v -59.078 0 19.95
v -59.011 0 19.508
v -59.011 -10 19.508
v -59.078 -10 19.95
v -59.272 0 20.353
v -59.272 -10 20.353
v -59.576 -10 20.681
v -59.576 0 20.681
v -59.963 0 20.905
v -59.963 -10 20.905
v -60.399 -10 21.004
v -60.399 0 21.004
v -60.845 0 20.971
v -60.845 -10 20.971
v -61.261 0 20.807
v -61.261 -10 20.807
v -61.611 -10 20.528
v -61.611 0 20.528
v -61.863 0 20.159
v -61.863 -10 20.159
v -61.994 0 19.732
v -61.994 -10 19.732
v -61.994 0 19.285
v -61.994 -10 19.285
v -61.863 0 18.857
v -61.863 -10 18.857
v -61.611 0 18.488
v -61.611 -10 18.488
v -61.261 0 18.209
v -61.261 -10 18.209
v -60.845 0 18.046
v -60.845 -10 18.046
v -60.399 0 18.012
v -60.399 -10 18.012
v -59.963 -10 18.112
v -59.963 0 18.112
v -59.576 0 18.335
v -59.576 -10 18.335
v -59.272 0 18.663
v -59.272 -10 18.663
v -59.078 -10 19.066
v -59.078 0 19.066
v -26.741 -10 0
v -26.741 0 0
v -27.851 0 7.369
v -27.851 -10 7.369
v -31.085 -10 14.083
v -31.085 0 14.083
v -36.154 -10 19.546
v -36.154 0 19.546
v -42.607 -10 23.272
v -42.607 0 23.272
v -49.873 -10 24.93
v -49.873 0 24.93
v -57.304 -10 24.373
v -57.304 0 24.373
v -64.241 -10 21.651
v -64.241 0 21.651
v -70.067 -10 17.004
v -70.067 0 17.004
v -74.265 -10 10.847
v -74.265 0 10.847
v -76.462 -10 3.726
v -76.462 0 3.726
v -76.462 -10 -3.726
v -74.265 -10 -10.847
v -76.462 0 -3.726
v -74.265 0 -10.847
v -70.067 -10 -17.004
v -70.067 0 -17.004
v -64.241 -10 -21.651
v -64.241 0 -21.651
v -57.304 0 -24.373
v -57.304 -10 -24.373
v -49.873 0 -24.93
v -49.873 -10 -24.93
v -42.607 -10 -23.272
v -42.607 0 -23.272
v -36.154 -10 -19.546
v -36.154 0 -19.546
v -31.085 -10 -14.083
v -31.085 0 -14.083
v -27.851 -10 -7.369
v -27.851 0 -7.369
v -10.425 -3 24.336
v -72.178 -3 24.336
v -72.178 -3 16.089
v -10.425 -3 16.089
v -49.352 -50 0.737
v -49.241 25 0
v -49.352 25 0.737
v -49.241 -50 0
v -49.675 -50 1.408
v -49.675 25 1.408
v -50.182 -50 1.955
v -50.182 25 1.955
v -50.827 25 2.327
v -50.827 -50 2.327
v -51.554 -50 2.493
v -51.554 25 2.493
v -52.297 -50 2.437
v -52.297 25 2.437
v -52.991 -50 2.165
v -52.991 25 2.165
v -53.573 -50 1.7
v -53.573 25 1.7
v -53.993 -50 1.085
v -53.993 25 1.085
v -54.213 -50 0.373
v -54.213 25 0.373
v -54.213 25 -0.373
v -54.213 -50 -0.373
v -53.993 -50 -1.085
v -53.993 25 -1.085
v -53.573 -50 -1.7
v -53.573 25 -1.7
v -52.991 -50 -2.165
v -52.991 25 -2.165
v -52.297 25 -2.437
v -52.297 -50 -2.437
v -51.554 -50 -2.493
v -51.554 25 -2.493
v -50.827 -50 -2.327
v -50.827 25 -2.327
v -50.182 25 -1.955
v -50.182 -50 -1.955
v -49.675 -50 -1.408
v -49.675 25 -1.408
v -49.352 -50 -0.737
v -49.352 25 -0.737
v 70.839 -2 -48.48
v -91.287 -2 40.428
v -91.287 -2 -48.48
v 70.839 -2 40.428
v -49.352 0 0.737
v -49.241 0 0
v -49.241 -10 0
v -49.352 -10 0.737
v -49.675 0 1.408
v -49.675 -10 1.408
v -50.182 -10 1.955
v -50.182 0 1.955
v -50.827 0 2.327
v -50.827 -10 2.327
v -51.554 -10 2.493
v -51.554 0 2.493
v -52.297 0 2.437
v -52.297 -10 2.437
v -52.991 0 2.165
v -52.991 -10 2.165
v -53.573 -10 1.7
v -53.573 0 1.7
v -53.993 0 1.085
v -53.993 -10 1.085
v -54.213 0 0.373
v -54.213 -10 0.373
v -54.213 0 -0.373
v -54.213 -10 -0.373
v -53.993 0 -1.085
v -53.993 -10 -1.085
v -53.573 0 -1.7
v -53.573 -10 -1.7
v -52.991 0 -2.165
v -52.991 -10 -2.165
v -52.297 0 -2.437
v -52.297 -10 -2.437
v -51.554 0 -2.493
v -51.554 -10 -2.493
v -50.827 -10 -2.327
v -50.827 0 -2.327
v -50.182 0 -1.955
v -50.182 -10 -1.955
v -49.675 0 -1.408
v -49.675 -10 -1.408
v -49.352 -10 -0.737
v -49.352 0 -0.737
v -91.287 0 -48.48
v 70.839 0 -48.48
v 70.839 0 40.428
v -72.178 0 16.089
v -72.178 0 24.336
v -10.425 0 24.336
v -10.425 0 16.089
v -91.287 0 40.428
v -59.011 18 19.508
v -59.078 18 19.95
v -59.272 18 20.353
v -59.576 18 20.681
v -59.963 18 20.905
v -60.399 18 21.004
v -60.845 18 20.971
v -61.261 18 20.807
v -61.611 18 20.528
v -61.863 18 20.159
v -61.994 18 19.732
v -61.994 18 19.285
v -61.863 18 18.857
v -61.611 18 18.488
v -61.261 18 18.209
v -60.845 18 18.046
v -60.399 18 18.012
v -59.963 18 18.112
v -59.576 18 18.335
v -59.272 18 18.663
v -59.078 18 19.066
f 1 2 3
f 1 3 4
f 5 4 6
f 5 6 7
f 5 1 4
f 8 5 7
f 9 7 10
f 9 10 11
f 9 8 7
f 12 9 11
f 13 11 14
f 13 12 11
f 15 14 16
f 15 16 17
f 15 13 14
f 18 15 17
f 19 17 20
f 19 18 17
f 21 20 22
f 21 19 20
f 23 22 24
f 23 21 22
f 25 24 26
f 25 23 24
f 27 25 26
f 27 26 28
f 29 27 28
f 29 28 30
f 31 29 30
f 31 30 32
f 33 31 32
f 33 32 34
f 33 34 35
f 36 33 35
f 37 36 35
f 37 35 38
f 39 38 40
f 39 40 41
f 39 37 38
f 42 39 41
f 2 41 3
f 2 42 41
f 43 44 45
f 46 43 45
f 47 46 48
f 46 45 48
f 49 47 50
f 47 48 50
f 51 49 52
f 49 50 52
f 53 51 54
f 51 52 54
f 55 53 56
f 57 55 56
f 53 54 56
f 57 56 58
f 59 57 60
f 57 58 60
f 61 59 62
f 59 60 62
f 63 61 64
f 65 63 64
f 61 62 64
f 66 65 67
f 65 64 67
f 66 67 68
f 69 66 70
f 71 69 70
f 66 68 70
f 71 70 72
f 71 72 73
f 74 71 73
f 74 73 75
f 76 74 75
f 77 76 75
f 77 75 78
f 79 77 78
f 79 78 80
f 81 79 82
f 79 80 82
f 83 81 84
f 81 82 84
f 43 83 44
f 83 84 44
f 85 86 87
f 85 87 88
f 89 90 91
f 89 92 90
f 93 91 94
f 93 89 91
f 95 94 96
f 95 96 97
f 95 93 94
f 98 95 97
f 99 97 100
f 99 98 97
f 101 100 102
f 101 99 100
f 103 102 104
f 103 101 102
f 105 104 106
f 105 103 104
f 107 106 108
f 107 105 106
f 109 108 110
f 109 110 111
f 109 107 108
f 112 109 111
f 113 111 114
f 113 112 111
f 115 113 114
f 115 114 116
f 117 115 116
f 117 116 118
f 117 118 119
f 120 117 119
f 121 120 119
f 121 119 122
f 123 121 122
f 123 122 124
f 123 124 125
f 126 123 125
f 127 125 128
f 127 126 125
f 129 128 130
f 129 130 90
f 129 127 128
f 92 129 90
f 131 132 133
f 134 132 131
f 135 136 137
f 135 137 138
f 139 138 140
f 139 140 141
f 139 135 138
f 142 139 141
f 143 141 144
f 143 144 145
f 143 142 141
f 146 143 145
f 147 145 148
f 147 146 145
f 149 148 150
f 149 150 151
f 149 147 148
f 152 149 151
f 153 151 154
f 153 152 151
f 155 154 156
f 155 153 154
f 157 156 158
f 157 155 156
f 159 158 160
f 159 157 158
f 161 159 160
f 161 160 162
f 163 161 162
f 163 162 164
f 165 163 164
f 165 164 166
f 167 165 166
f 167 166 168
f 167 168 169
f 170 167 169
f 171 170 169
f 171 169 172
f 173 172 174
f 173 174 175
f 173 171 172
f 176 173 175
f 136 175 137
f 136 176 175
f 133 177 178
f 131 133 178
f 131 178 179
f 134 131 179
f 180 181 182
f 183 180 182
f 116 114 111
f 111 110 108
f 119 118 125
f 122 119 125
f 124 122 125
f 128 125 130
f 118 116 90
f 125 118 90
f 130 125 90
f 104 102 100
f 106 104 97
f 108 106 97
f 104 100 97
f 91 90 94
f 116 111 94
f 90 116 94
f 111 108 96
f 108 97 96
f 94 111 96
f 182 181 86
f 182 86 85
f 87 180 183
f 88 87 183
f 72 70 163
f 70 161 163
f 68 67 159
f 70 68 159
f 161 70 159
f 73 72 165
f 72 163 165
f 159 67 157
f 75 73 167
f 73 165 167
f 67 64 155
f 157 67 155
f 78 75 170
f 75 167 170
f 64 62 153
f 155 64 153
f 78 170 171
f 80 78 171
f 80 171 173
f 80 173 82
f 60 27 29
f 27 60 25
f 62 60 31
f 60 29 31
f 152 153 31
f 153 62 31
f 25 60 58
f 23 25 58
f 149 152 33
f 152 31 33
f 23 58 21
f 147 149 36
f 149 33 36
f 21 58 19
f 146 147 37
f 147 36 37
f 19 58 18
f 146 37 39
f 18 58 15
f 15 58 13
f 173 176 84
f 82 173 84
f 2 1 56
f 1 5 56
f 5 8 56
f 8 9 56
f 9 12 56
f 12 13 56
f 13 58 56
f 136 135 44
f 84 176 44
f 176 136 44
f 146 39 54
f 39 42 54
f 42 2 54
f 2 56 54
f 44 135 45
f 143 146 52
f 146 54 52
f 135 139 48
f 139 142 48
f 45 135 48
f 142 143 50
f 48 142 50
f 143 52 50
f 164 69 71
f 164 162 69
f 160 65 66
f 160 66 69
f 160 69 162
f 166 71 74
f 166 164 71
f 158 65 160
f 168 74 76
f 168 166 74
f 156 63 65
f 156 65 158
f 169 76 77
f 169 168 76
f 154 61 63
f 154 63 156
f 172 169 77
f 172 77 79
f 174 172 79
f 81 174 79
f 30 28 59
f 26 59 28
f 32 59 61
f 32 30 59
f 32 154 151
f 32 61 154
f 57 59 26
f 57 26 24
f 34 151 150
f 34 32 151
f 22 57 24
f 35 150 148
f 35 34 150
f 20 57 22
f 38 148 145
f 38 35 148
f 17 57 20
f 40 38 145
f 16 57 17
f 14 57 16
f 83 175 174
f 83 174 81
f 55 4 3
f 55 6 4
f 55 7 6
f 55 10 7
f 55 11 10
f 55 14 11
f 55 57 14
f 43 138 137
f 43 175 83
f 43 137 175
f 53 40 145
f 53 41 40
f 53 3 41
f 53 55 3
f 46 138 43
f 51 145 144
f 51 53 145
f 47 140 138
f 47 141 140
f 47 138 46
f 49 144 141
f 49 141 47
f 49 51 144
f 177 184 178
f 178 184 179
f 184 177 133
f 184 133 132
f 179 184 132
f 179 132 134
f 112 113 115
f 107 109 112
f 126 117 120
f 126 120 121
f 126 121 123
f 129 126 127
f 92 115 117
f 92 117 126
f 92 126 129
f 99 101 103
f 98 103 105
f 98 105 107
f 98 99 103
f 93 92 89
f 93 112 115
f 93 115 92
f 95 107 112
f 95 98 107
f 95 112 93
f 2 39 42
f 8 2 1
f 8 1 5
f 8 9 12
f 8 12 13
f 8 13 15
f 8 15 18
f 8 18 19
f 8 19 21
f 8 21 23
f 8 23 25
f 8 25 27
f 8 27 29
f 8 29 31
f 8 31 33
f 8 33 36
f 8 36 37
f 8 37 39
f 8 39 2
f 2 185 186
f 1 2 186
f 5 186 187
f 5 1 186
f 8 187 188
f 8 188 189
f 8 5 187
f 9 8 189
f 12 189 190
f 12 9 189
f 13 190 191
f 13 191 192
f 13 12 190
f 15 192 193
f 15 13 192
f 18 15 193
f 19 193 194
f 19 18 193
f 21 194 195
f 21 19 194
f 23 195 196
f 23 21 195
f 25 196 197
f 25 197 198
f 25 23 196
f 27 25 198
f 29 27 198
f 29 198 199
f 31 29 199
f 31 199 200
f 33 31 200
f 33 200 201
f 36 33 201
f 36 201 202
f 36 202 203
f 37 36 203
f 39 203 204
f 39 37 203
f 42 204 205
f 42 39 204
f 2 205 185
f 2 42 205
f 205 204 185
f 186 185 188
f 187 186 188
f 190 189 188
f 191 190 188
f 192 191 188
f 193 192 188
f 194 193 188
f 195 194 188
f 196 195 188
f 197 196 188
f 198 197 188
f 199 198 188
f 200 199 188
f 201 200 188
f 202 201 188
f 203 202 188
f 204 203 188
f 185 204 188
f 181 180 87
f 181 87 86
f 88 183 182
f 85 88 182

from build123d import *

# Parameters (mm, degrees)
F0_R          = 25
F0_R_2        = 1.5
F0_R_3        = 2.5
F1_DEPTH      = 10
F2_DEPTH      = 50
F2_DEPTH_BACK = 25
F3_W          = 162.1264517307
F3_H          = 88.9080502093
F4_DEPTH      = 2
F5_DEPTH      = 18
F7_DEPTH      = 3
F6_W          = 61.7528790608
F6_H          = 8.2471277565


with BuildPart() as f1:
    # F0 (on Front) → F1 (new body)
    with BuildSketch(Plane.XZ):
        with Locations((-51.7407789791, 0)):
            Circle(F0_R)
        with Locations((-60.5111941695, 19.5082370192)):
            Circle(F0_R_2, mode=Mode.SUBTRACT)
        with Locations((-51.7407789791, 0)):
            Circle(F0_R_3, mode=Mode.SUBTRACT)
    extrude(amount=F1_DEPTH)


with BuildPart() as f2:
    # F0 (on Front) → F2 (new body, two sides)
    with BuildSketch(Plane.XZ) as f2_sk:
        with Locations((-51.7407789791, 0)):
            Circle(F0_R_3)
    extrude(amount=F2_DEPTH)
    extrude(f2_sk.sketch, amount=-F2_DEPTH_BACK)


with BuildPart() as f4:
    # F3 (on Front) → F4 (new body)
    with BuildSketch(Plane.XZ):
        with Locations((-10.2238357067, -4.0262471884)):
            Rectangle(F3_W, F3_H)
    extrude(amount=F4_DEPTH)


with BuildPart() as f5:
    # F0 (on Front) → F5 (new body)
    with BuildSketch(Plane.XZ):
        with Locations((-60.5111941695, 19.5082370192)):
            Circle(F0_R_2)
    extrude(amount=-F5_DEPTH)


with BuildPart() as f7:
    # F0 (on Front) → F7 (new body)
    with BuildSketch(Plane.XZ):
        with Locations((-60.5111941695, 19.5082370192)):
            Circle(F0_R_2)
    extrude(amount=F7_DEPTH)


with BuildPart() as f7b:
    # F6 (on Front) → F7, piece 2 (new body)
    with BuildSketch(Plane.XZ):
        with Locations((-41.3014250807, 20.2122600749)):
            Rectangle(F6_W, F6_H)
    extrude(amount=F7_DEPTH)


solid = Compound([f1.part, f2.part, f4.part, f5.part, f7b.part])
